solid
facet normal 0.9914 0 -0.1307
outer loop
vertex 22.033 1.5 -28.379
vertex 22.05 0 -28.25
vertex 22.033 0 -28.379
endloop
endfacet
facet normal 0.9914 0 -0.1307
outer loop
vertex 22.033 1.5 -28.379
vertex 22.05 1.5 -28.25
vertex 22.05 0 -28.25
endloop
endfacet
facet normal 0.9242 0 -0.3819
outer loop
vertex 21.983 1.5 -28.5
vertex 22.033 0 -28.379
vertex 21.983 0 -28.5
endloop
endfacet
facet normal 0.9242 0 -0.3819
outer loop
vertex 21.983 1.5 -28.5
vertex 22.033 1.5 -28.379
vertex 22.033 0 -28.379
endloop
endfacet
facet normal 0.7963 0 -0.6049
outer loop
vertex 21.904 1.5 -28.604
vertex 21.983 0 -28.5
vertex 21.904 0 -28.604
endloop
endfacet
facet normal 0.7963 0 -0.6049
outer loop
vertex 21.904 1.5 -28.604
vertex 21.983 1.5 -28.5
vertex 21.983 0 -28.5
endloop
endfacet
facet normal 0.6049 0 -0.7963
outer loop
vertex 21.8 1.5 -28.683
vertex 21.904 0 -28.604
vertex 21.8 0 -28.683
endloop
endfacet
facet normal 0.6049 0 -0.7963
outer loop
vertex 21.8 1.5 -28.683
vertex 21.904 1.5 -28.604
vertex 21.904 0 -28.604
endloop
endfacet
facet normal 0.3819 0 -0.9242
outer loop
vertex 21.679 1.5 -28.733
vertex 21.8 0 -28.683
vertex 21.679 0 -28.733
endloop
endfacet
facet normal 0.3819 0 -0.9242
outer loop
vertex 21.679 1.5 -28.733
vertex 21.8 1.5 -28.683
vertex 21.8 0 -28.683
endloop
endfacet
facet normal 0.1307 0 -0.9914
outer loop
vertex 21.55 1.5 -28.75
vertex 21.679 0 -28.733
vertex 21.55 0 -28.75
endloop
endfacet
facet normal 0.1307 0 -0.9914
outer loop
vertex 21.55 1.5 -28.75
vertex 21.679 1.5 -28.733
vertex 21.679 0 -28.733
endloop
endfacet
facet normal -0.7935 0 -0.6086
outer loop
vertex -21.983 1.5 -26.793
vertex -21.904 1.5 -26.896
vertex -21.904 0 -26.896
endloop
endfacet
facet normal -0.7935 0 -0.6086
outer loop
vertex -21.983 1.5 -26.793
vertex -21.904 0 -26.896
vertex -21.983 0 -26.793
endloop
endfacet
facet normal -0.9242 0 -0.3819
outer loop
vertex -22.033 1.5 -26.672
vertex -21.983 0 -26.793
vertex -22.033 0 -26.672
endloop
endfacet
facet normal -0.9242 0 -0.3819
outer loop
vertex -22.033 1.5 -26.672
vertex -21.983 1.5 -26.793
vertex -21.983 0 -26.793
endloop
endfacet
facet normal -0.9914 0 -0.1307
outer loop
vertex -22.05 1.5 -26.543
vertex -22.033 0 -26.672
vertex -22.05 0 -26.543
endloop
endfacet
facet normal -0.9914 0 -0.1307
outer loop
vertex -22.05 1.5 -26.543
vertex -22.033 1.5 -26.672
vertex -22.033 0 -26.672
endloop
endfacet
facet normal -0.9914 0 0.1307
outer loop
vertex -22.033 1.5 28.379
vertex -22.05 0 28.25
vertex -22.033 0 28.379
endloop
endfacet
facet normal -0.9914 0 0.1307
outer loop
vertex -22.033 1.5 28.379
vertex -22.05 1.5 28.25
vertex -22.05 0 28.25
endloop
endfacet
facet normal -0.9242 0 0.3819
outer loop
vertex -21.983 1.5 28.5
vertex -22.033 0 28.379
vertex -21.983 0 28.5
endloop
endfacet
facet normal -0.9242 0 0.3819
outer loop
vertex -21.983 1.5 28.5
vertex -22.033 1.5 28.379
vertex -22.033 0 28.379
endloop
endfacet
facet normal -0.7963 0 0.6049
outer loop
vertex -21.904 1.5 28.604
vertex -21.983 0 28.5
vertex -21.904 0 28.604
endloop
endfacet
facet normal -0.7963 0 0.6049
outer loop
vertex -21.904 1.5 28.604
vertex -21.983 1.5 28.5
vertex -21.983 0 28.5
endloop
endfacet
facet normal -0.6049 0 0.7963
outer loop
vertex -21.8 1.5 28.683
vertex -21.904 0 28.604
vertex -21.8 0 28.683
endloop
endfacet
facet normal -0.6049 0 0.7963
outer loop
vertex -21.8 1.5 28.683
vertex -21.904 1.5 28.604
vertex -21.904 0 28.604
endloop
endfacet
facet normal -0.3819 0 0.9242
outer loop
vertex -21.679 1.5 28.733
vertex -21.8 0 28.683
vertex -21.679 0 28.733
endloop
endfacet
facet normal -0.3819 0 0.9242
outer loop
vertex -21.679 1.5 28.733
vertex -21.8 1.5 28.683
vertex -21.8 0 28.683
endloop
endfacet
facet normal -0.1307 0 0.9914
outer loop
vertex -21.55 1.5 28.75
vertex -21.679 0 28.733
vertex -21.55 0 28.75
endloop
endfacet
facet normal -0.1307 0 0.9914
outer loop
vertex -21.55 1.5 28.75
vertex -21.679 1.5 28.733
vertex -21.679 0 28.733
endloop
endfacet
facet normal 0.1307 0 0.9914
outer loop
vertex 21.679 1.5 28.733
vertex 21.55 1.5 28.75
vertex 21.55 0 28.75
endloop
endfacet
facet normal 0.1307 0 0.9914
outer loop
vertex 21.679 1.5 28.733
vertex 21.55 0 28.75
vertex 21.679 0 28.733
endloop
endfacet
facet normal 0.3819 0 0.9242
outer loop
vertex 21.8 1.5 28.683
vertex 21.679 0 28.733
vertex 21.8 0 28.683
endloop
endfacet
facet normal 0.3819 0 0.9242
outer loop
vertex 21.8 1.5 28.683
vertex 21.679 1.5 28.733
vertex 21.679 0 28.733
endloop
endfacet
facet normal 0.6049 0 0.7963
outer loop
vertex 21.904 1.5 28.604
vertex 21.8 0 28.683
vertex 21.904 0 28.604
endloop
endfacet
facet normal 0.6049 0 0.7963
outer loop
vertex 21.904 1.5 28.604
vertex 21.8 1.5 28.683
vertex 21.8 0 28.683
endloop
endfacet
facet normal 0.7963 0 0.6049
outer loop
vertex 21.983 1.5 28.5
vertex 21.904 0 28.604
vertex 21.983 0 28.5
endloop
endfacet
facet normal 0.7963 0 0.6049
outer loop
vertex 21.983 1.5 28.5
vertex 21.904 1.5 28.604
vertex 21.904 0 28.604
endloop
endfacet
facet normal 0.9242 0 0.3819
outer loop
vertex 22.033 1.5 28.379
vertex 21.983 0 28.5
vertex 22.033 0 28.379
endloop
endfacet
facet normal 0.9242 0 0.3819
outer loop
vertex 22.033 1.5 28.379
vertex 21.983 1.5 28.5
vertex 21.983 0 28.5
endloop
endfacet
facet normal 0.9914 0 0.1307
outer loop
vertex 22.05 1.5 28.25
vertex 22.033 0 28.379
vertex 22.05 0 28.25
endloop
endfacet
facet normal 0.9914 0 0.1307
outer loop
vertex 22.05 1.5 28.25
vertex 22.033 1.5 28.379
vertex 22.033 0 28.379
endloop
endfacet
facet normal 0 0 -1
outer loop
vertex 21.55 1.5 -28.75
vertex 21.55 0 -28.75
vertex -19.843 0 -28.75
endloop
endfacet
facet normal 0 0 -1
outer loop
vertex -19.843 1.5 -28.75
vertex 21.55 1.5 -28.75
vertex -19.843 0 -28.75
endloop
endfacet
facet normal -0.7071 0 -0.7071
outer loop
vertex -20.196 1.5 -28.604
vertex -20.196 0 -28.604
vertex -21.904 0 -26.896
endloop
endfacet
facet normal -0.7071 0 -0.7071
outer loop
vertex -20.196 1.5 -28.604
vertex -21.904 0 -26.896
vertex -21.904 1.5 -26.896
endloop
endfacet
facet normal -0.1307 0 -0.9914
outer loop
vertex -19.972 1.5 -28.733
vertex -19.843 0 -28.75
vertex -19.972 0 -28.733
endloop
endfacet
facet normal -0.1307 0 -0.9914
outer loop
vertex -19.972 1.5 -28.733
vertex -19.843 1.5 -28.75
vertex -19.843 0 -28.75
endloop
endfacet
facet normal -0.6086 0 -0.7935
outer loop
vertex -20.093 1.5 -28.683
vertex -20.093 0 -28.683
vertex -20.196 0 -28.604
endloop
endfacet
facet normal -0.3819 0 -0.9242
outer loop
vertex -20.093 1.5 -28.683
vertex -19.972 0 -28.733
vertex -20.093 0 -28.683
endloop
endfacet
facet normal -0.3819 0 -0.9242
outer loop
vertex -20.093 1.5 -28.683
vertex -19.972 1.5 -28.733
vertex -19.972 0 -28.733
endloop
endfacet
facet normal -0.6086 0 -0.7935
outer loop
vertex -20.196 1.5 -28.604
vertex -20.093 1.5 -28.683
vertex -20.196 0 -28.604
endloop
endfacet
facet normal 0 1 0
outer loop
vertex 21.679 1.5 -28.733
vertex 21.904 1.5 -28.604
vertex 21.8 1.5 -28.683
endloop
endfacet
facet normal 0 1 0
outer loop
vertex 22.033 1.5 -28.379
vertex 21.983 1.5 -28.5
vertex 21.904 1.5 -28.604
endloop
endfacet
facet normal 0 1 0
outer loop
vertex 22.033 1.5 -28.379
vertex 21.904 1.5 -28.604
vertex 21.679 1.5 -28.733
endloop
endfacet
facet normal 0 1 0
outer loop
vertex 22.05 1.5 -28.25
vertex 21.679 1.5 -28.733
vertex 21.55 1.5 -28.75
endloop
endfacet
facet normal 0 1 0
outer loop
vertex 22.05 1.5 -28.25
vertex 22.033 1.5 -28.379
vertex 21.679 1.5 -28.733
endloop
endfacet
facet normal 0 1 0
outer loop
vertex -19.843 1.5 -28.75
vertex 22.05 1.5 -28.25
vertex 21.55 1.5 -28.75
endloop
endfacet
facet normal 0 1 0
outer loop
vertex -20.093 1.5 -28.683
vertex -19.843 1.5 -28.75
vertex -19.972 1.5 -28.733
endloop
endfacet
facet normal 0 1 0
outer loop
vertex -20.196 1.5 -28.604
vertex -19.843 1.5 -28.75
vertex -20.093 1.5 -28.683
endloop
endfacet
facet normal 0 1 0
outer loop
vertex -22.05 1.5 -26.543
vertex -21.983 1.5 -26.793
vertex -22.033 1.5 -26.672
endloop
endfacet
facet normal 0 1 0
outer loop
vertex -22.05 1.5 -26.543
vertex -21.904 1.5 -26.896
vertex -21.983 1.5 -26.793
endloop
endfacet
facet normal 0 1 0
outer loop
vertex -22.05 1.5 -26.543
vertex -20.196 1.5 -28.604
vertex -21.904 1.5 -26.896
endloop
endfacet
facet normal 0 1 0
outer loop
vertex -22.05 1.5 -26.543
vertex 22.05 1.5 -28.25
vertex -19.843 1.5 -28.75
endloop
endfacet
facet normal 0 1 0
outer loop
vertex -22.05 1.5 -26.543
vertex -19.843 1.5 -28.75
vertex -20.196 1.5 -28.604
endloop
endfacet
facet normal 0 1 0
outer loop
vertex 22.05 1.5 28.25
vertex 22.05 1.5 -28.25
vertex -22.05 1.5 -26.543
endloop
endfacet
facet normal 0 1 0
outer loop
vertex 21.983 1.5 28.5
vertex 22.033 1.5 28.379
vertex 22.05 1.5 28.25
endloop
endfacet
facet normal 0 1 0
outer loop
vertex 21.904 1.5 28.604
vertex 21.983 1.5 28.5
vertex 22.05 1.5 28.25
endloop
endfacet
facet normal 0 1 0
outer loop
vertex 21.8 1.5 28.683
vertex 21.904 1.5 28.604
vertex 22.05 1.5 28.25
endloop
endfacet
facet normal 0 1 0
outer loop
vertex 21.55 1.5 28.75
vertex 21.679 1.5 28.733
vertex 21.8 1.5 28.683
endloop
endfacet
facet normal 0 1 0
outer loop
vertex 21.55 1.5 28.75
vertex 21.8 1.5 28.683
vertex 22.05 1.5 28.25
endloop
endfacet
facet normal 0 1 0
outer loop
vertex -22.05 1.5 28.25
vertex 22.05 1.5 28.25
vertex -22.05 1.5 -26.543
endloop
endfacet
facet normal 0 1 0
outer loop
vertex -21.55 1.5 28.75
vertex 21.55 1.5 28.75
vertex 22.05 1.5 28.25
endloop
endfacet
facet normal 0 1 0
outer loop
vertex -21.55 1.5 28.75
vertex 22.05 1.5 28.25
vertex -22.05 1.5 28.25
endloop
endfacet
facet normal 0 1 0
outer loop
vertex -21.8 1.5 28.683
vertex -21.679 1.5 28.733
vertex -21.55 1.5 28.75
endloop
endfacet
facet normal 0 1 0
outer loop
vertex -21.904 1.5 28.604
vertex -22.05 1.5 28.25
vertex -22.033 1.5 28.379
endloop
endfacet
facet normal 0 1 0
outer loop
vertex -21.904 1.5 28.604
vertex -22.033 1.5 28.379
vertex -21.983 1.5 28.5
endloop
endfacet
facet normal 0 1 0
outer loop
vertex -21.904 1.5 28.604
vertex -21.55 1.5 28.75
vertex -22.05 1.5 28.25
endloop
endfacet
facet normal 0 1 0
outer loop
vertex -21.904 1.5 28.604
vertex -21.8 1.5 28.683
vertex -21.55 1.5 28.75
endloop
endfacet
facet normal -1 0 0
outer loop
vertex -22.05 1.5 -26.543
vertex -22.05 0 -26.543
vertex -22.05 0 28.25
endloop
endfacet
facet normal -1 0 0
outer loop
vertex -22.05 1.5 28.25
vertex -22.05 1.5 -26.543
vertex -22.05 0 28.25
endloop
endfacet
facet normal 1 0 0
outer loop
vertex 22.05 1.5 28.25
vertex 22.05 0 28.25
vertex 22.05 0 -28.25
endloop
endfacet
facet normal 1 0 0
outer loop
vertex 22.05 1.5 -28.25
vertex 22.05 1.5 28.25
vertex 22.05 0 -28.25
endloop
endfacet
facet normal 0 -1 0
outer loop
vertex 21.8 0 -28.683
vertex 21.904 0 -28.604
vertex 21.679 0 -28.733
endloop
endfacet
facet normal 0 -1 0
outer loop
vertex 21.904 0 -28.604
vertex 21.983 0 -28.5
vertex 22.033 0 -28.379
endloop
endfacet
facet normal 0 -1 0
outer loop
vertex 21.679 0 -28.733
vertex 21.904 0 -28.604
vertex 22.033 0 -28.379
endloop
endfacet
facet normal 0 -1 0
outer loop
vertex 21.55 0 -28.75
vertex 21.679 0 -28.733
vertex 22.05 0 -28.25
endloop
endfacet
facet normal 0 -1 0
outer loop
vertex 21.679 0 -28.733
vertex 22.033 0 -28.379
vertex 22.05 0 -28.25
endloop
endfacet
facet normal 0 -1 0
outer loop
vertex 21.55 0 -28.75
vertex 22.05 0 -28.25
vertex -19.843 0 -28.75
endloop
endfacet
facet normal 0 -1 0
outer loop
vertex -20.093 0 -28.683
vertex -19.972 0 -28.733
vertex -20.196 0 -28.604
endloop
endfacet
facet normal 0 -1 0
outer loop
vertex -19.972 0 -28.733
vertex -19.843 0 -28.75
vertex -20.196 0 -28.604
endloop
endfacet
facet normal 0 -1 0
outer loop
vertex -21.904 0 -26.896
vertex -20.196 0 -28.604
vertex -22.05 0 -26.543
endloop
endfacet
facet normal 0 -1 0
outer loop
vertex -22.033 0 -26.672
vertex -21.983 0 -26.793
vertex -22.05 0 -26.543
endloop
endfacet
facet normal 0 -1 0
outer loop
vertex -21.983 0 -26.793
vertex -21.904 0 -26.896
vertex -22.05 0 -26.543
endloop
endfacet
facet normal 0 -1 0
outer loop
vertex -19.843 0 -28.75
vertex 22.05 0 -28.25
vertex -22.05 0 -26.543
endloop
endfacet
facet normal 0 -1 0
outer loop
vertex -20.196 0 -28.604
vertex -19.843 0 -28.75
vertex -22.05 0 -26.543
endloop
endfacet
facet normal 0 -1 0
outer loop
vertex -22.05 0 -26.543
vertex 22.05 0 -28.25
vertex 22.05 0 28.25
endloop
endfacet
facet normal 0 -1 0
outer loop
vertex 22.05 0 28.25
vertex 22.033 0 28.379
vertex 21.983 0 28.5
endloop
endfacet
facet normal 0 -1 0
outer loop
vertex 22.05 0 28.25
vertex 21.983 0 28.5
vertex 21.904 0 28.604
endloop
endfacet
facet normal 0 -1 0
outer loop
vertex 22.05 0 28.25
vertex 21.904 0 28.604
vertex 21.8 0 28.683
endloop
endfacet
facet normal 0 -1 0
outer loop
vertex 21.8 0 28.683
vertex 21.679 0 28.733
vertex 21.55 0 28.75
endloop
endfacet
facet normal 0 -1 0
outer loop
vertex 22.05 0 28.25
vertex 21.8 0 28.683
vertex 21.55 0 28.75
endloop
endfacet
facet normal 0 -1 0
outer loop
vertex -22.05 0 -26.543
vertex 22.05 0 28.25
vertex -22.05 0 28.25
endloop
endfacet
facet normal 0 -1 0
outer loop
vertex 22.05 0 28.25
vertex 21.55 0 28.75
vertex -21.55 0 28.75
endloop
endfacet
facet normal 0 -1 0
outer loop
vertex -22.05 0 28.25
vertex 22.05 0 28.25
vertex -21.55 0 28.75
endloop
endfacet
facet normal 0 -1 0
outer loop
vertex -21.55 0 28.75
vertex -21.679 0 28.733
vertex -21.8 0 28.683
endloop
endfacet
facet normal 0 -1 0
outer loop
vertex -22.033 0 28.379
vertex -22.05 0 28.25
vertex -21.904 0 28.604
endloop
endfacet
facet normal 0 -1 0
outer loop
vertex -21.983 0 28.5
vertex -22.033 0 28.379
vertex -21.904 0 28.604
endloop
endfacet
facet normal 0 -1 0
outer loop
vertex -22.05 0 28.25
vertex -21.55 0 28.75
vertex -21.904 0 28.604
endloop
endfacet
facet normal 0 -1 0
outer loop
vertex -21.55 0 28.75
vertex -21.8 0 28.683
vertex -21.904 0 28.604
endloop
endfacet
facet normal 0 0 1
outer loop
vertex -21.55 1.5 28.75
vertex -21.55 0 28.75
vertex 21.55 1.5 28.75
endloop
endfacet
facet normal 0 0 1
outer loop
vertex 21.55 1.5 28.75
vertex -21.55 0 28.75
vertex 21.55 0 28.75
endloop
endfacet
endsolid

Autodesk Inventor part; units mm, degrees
ref_plane "YZ Plane" through (0, 0, 0) normal (1, 0, 0) x (0, 1, 0)
ref_plane "XZ Plane" through (0, 0, 0) normal (0, 1, 0) x (-1, 0, 0)
ref_plane "XY Plane" through (0, 0, 0) normal (0, 0, 1) x (1, 0, 0)
sketch "Sketch1" plane through (0, 0, 0) normal (0, 1, 0) x (-1, 0, 0)
  line L0 (-22.05, -28.75) -> (22.05, -28.75)
  line L1 (22.05, -28.75) -> (22.05, 28.75)
  line L2 (22.05, 28.75) -> (-22.05, 28.75)
  line L3 (-22.05, 28.75) -> (-22.05, -28.75)
  line L4 (-22.05, -28.75) -> (22.05, 28.75) construction
  line L5 (22.05, -28.75) -> (-22.05, 28.75) construction
  point P0 (0, 0)
  dimension "d0" = 57.5
  dimension "d1" = 44.1
extrude "Extrusion1" add sketch "Sketch1" along normal blind 1.5
chamfer "Chamfer1" distance 2 angle 45 1 edges at (-22.05, 0.75, -28.75)
fillet "Fillet1" radius 0.5 5 edges at (22.05, 0.75, 28.75) (-22.05, 0.75, 28.75) (22.05, 0.75, -28.75) (-20.05, 0.75, -28.75) (-22.05, 0.75, -26.75)
properties part number "Flex Cover V1" material "Thermoplastic Resin"
